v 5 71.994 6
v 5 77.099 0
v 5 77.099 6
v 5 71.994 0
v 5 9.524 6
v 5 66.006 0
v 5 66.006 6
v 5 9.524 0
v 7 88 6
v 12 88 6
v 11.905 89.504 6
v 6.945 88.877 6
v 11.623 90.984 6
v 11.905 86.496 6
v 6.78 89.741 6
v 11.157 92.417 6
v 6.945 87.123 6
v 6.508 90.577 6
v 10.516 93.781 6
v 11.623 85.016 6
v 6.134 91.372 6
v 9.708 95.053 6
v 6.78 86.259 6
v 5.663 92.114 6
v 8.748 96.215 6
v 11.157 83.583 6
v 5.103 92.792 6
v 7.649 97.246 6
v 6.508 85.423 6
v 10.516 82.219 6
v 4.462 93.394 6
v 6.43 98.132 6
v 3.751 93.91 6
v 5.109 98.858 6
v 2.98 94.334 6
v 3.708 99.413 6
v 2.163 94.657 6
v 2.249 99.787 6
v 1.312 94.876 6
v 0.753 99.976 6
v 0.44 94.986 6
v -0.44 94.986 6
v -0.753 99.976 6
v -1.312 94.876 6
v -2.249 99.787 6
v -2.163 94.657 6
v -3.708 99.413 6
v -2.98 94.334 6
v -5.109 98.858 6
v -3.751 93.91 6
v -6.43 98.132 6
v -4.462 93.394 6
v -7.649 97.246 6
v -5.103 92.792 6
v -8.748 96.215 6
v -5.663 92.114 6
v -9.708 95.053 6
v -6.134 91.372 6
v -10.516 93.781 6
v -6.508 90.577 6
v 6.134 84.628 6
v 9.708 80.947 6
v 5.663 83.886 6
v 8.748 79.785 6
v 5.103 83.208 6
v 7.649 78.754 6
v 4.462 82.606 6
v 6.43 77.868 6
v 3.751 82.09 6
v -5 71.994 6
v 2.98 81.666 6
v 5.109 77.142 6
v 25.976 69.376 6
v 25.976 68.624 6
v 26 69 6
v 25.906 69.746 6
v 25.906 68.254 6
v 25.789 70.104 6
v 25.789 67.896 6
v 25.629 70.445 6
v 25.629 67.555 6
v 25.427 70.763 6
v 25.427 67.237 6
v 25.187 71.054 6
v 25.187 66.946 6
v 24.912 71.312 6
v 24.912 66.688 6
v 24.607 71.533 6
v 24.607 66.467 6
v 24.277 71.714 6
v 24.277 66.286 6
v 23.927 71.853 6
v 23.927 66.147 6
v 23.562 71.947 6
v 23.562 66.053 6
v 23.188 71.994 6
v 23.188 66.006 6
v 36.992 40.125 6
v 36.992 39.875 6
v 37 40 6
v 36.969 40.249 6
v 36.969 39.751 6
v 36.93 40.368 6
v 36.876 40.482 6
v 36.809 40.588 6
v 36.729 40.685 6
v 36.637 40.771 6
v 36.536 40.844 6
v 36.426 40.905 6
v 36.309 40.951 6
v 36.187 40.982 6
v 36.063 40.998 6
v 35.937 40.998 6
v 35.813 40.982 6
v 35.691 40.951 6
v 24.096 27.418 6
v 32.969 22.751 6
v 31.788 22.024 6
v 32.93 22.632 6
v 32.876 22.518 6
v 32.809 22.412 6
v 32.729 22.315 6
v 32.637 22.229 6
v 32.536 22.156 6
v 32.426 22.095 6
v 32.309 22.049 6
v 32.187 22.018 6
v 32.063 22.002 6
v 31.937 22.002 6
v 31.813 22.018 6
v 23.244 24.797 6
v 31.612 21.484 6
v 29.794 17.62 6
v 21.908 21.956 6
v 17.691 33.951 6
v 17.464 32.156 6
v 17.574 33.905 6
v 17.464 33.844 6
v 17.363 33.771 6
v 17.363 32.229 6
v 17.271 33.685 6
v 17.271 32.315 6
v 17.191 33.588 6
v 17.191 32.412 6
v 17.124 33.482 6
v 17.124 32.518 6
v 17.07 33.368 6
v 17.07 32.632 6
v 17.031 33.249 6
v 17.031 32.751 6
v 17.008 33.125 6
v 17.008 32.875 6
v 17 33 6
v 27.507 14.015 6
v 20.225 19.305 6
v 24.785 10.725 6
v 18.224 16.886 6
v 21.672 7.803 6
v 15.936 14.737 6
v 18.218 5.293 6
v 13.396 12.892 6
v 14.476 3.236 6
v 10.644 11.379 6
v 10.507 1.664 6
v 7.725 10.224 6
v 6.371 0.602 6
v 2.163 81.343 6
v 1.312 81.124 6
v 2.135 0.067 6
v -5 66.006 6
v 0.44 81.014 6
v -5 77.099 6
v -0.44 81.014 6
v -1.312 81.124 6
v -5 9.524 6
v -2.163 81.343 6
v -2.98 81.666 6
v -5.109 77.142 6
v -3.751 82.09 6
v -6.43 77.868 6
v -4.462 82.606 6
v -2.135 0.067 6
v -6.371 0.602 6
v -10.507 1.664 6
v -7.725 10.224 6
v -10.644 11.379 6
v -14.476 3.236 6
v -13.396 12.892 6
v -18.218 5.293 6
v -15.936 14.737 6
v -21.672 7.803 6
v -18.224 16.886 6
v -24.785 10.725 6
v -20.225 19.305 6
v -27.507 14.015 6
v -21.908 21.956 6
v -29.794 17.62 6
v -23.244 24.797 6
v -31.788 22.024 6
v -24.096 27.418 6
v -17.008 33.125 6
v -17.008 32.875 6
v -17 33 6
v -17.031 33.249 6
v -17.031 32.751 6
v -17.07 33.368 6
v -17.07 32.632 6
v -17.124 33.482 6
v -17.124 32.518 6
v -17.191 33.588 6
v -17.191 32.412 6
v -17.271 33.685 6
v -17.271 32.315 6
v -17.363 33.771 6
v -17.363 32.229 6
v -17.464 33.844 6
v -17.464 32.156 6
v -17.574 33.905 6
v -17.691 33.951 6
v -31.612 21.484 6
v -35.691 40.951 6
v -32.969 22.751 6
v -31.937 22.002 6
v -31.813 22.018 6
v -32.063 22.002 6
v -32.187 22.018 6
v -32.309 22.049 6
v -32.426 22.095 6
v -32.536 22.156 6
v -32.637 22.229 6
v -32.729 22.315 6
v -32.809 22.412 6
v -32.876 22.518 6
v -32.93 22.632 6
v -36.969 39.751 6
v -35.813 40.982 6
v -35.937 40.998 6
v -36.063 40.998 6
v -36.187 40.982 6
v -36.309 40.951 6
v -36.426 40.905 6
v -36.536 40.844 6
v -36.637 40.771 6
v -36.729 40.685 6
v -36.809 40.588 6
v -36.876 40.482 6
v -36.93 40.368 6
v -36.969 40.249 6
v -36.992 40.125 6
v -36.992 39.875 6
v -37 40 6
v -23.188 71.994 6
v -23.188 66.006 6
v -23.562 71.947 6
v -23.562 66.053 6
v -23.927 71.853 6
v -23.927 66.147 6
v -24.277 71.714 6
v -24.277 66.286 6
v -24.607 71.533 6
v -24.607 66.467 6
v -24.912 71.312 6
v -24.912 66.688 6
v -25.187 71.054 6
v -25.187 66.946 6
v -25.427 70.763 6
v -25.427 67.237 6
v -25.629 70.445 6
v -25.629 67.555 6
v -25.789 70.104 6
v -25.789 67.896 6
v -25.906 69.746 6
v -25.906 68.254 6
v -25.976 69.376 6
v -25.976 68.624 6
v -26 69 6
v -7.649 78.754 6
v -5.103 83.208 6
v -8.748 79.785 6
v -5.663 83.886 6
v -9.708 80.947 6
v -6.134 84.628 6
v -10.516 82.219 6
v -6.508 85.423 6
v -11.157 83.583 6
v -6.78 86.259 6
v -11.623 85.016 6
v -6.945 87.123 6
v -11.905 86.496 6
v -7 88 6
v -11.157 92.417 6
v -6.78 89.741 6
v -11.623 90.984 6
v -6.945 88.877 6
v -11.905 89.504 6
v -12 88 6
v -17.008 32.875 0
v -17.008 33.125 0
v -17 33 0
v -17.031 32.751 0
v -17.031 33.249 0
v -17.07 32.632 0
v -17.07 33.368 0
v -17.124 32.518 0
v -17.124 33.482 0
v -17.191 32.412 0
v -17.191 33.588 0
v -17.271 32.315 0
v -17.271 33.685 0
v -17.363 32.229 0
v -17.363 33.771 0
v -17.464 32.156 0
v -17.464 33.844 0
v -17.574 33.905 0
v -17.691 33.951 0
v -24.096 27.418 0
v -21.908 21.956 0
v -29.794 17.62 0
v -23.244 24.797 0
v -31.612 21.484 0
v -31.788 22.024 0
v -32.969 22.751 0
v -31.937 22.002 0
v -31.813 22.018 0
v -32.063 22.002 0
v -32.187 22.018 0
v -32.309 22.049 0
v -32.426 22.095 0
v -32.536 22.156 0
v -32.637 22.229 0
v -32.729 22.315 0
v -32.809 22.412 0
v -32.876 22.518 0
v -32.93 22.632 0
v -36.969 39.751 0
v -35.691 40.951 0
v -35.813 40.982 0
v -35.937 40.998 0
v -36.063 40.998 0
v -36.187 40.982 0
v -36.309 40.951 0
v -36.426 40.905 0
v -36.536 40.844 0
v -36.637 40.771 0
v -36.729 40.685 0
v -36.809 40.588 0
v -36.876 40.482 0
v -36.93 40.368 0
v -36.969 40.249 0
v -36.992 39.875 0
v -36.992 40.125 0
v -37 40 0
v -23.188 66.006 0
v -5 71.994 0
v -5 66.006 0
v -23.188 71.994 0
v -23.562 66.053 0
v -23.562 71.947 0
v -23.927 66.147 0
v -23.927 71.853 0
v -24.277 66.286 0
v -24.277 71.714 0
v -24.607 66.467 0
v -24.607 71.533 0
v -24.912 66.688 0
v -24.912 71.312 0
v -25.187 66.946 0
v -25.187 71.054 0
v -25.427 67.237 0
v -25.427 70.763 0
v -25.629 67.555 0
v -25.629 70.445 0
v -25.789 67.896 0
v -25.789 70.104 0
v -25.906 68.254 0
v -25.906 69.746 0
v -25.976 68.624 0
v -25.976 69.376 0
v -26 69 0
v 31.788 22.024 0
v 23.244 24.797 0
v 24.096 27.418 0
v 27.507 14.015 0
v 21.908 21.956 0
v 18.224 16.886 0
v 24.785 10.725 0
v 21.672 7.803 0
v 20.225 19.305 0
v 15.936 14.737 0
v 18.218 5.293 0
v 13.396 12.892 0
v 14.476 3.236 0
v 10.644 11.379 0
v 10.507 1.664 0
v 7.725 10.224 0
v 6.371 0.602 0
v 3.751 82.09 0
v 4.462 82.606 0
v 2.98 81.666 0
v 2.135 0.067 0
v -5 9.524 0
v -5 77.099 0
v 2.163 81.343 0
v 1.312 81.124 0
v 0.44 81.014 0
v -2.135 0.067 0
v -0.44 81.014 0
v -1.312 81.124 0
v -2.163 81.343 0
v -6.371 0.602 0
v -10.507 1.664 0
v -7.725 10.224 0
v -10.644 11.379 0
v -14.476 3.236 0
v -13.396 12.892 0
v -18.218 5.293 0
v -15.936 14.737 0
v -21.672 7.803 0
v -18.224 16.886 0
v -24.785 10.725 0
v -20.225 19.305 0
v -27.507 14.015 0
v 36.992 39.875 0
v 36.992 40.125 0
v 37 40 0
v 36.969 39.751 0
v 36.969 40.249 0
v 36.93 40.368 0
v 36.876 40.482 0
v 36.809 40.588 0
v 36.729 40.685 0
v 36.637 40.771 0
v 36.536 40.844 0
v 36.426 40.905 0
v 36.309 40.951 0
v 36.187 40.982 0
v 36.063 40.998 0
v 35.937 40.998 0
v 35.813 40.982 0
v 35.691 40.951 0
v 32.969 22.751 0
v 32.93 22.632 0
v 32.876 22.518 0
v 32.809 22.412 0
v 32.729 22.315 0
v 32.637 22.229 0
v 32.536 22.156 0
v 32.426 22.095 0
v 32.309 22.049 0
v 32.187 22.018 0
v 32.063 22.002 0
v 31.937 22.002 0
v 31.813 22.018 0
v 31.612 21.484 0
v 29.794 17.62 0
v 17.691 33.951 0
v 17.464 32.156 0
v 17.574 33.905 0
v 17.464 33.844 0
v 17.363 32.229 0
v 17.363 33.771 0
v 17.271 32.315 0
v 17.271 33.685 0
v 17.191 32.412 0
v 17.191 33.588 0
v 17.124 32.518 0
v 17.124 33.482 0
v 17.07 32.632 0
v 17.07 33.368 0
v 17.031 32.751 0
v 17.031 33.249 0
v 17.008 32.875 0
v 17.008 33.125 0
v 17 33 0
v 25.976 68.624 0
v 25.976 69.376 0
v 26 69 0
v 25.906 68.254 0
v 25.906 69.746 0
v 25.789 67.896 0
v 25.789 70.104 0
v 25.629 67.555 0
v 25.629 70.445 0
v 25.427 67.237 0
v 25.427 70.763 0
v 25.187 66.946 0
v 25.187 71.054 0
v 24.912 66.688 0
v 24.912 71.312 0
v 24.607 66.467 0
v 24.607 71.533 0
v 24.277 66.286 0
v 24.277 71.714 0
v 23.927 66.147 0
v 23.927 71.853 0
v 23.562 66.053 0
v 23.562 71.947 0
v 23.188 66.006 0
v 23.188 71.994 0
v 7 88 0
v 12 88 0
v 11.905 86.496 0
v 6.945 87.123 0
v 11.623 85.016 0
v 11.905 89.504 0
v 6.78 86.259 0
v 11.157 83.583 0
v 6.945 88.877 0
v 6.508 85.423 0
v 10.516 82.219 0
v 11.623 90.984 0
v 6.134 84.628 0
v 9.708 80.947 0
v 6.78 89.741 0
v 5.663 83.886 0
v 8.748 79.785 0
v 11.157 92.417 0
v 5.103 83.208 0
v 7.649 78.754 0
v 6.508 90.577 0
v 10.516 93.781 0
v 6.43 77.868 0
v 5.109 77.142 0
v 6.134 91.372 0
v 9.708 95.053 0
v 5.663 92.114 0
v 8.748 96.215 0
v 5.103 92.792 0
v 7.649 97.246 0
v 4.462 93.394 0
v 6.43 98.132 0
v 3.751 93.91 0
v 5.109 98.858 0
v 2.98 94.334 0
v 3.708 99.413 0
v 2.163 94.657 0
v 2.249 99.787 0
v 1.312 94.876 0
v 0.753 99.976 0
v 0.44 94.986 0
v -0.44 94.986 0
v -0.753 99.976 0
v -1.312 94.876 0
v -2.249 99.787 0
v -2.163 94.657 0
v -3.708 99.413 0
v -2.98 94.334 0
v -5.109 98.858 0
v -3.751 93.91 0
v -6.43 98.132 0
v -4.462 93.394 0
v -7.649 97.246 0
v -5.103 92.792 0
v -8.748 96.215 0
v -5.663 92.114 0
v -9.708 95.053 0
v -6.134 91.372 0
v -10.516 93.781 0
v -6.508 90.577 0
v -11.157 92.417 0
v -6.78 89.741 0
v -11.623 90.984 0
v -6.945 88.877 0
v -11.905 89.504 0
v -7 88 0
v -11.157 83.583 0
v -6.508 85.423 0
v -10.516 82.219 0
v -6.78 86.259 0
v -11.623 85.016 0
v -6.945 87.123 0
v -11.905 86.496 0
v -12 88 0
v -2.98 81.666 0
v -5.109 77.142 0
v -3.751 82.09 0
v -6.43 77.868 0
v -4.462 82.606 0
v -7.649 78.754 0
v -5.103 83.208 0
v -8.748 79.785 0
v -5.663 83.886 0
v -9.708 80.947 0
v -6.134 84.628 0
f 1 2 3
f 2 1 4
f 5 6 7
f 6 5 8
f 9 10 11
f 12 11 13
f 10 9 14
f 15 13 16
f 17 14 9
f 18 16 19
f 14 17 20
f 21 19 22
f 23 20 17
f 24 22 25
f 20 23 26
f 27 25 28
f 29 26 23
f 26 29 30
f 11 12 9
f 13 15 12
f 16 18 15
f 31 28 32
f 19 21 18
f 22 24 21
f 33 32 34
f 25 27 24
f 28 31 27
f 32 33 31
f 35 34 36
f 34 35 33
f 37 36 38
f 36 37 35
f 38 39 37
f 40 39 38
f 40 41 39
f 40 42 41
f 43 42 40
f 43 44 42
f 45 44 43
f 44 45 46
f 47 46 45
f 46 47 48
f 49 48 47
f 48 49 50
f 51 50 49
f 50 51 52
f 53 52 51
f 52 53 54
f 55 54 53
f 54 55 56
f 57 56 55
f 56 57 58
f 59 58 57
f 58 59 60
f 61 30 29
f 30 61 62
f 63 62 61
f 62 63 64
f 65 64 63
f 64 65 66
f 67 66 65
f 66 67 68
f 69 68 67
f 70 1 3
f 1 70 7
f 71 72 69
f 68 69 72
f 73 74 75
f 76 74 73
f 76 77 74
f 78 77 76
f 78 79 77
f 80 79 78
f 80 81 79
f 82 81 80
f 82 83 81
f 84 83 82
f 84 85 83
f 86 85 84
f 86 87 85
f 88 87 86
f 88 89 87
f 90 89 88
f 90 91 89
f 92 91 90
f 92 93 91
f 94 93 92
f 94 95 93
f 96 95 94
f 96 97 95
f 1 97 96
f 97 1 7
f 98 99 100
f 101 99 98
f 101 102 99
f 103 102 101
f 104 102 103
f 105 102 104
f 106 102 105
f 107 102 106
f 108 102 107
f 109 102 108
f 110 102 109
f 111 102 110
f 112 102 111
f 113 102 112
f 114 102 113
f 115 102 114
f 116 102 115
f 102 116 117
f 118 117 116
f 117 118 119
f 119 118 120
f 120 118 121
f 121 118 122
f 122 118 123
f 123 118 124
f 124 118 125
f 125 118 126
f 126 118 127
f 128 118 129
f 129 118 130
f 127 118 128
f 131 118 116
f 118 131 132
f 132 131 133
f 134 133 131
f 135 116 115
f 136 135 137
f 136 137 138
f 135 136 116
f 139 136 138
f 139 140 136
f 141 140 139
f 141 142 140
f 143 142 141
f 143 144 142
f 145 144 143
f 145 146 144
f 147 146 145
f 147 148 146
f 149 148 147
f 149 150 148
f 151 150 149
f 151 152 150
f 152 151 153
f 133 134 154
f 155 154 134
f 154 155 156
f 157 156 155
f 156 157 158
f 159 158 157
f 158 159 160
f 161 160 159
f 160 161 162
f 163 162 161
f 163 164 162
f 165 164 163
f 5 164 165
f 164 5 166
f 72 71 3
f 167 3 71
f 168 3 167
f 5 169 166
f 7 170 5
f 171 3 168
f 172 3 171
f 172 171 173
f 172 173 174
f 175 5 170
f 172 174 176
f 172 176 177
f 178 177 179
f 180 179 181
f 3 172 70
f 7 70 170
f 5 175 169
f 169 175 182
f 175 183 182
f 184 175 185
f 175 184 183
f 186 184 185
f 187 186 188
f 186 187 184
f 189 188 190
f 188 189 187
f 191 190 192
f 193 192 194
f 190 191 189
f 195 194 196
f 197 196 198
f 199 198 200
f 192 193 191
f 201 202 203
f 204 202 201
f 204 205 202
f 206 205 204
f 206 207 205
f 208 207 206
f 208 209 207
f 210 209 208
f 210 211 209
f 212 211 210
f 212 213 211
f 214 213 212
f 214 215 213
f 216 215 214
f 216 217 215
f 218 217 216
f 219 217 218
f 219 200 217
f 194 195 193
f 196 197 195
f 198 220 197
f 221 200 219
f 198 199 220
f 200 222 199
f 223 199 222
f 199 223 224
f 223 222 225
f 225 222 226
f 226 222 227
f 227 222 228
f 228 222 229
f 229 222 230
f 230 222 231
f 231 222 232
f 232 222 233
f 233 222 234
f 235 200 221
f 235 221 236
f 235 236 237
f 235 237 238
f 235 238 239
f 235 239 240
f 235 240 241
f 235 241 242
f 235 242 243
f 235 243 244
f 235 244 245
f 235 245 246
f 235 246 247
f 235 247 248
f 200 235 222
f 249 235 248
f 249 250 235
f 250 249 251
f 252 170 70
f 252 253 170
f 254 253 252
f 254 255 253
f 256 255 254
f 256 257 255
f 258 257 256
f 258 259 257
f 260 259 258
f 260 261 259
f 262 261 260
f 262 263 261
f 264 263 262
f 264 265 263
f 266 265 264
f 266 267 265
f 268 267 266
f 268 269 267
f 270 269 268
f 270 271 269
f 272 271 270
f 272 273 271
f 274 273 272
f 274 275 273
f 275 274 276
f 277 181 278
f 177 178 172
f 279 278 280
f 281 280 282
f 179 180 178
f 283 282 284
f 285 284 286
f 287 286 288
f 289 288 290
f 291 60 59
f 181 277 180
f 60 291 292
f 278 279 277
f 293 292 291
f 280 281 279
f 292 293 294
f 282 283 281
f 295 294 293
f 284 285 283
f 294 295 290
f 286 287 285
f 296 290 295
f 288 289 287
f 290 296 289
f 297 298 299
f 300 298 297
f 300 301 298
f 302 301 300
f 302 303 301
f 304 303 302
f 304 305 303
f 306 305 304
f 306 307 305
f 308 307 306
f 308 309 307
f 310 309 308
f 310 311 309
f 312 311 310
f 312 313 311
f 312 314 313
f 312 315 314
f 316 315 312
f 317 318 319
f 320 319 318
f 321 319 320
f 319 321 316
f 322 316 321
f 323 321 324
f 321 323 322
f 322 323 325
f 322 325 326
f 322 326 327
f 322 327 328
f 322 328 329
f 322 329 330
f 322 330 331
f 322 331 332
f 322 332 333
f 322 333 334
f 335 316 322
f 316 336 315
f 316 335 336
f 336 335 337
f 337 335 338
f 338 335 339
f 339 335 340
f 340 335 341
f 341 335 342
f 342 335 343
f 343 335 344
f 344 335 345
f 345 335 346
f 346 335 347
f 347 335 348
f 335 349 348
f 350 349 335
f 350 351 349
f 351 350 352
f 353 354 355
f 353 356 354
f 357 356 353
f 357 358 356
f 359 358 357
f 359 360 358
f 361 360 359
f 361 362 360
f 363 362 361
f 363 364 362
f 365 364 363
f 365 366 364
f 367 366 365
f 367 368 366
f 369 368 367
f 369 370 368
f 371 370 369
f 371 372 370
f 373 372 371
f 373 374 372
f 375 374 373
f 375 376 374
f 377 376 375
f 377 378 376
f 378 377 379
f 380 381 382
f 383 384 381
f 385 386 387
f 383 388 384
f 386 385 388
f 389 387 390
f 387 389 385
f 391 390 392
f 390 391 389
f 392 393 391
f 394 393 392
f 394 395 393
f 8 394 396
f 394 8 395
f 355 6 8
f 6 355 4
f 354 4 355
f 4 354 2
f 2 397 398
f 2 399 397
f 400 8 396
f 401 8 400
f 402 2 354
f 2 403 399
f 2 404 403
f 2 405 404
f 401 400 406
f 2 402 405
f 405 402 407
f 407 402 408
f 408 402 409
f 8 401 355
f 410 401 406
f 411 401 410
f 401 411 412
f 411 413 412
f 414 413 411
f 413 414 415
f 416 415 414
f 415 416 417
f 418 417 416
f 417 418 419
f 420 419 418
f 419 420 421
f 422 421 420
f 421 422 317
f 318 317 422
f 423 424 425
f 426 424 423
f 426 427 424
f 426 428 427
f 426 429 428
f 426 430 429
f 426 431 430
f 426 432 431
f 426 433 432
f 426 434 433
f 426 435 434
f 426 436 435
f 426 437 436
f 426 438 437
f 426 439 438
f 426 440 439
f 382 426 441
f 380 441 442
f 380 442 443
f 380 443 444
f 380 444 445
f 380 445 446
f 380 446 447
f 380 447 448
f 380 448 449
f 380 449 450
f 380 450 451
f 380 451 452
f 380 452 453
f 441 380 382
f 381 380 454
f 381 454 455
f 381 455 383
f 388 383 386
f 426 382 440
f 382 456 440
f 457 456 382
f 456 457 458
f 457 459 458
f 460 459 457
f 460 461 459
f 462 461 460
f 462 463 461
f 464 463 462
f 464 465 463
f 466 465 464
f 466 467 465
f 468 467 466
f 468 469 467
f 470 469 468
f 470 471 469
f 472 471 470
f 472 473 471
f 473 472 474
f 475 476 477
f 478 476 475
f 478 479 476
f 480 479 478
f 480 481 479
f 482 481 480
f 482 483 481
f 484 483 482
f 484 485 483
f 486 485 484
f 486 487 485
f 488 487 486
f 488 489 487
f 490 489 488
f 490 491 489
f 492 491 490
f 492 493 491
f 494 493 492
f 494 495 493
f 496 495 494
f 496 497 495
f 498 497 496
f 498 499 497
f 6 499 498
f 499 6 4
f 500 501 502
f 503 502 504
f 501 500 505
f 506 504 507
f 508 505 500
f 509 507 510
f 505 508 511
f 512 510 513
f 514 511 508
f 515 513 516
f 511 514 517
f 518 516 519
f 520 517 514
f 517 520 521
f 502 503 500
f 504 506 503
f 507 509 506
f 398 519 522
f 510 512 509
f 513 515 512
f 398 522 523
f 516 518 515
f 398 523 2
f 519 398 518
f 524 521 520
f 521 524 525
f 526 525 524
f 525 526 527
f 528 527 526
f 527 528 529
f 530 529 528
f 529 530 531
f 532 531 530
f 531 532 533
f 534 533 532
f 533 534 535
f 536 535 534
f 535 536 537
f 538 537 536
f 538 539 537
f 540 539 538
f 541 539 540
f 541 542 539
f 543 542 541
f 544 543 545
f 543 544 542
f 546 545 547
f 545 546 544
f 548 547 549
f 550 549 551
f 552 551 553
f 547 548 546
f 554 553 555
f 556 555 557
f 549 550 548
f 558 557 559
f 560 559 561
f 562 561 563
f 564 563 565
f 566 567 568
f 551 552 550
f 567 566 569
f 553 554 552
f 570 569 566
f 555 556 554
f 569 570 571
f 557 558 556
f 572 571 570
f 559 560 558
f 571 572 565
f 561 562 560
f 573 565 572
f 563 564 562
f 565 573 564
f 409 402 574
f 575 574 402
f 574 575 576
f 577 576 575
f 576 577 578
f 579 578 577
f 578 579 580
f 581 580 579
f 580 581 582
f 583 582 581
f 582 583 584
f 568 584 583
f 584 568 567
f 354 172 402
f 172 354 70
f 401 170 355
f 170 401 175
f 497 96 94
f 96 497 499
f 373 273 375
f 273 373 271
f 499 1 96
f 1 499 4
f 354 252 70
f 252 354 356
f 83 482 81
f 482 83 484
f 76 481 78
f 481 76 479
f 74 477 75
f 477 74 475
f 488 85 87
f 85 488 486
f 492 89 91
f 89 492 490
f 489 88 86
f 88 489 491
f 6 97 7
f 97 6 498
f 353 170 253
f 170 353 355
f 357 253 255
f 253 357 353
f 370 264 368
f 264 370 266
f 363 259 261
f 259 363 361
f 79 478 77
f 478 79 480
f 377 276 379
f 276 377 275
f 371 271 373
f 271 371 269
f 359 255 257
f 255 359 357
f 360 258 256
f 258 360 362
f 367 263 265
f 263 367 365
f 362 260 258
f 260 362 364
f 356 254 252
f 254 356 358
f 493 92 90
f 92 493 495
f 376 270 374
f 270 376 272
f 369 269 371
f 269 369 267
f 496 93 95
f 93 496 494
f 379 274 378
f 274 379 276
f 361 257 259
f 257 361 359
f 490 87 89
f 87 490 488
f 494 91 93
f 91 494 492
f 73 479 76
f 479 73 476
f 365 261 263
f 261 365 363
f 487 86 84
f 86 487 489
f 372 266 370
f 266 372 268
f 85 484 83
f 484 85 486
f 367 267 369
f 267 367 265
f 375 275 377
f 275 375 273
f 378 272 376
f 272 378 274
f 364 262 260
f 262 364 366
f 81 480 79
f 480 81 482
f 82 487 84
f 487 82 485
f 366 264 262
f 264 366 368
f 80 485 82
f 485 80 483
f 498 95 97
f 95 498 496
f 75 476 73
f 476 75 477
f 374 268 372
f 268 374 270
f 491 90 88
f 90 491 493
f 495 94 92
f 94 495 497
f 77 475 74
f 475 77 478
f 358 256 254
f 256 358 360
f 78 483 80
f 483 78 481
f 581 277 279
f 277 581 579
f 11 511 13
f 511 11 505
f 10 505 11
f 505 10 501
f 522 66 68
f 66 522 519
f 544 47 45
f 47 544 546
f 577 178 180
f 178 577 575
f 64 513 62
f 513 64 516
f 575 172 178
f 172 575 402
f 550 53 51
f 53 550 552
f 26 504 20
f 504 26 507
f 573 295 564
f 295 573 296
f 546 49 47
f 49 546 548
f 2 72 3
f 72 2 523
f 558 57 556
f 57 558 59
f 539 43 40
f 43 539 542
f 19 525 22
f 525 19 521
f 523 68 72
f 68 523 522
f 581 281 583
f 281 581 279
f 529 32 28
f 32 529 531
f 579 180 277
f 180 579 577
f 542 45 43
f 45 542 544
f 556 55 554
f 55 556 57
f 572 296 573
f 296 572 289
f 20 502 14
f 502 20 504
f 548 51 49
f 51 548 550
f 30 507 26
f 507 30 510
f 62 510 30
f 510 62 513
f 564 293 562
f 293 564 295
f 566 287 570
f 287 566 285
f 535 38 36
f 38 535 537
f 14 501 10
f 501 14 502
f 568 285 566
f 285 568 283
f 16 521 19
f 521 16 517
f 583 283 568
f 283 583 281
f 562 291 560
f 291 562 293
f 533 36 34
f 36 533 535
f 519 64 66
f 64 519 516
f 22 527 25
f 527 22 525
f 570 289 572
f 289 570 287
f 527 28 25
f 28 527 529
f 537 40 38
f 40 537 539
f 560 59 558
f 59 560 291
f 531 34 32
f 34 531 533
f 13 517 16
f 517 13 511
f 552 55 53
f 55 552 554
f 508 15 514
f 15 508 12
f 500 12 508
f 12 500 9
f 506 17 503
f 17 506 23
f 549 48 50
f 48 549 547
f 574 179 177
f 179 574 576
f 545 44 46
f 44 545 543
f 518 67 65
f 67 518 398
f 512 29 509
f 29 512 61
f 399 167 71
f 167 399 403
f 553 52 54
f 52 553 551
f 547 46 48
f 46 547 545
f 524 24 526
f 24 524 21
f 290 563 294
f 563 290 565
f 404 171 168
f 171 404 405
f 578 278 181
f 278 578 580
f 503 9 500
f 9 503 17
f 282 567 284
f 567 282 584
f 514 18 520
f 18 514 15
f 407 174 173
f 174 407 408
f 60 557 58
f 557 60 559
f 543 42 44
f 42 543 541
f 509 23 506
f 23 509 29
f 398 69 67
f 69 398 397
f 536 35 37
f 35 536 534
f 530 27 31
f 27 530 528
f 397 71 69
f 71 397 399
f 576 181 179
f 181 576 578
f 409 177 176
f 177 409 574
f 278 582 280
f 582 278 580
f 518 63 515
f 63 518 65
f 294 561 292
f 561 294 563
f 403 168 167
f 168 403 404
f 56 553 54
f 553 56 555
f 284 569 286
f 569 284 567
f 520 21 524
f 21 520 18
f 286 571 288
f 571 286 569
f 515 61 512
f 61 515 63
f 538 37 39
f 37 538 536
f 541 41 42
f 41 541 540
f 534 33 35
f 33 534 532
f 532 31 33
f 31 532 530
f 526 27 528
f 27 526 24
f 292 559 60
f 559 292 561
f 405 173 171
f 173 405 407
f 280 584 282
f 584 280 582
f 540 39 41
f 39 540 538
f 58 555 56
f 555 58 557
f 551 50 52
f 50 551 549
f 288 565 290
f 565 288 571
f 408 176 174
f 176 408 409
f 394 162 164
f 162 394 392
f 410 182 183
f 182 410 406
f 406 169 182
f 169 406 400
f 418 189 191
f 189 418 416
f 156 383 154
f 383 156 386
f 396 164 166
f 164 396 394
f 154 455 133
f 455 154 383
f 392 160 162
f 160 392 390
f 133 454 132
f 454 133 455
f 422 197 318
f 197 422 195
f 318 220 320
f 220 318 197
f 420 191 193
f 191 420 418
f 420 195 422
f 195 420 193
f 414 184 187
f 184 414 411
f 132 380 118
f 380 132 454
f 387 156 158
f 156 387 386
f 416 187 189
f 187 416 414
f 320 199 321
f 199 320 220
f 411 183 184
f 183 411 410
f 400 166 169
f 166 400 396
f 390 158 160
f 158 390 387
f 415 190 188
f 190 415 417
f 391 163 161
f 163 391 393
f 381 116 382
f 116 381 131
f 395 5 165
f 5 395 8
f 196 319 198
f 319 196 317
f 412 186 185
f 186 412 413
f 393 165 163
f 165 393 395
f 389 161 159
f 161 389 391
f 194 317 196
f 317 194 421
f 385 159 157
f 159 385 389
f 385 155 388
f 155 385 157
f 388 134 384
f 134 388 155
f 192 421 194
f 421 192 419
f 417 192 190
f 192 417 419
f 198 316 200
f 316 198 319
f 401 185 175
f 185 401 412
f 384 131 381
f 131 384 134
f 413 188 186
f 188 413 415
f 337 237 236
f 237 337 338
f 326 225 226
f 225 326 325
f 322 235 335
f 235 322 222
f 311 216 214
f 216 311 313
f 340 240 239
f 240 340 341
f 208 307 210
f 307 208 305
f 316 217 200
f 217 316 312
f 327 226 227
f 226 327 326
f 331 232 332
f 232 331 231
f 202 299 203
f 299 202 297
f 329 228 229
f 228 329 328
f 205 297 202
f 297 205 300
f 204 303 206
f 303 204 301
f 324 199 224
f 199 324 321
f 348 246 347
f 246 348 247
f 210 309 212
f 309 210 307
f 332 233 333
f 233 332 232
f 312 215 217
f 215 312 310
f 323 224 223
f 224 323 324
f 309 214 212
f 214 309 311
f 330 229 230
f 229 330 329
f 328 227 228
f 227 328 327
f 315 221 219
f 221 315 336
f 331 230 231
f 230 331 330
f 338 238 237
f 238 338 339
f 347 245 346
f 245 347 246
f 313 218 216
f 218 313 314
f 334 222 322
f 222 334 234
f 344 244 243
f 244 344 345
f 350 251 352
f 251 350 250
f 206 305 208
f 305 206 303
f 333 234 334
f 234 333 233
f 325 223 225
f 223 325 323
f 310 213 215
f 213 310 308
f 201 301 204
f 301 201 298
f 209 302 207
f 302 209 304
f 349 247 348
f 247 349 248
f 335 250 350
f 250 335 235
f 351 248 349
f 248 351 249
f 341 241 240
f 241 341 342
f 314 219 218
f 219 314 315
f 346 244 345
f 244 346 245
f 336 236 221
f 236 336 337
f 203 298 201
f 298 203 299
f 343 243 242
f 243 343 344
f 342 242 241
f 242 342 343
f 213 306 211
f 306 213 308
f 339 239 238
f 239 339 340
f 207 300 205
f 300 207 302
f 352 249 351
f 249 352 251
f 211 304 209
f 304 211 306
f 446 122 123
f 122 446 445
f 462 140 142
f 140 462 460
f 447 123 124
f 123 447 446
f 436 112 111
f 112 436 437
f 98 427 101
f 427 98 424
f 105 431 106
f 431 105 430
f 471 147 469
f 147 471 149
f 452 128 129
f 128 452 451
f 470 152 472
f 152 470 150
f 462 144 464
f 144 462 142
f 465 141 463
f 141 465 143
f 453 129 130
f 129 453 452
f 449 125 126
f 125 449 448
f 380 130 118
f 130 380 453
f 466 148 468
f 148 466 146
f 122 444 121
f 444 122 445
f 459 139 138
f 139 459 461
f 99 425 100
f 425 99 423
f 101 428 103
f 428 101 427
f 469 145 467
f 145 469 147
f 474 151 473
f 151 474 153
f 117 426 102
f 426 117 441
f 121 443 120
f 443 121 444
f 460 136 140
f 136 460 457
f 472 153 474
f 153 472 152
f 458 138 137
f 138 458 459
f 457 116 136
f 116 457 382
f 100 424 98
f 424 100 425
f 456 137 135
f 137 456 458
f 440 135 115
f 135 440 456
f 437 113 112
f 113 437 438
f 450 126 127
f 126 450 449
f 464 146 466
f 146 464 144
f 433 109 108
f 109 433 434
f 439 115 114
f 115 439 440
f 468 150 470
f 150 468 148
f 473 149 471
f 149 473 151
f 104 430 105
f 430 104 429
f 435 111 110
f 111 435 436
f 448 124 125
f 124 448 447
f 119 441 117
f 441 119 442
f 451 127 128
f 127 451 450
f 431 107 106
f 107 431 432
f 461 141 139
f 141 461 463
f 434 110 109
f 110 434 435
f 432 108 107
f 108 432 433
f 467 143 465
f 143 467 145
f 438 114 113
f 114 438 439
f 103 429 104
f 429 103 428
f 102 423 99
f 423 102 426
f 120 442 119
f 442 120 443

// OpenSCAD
union() {
  union() {
    union() {
      union() {
        union() {
          translate([-5, 0, 0]) {
            translate([0, 4, 0]) {
              cube([10, 76, 6]);
            }
          }
          hull() {
            translate([-23, 0, 0]) {
              translate([0, 69, 0]) {
                cylinder(h = 6, r = 3);
              }
            }
            translate([23, 0, 0]) {
              translate([0, 69, 0]) {
                cylinder(h = 6, r = 3);
              }
            }
          }
        }
        difference() {
          translate([0, 88, 0]) {
            cylinder(h = 6, r = 12);
          }
          translate([0, 88, 0]) {
            translate([0, 0, -1]) {
              cylinder(h = 8, r = 7);
            }
          }
        }
      }
      difference() {
        difference() {
          translate([0, 34, 0]) {
            cylinder(h = 6, r = 34);
          }
          translate([0, 34, 0]) {
            translate([0, 0, -1]) {
              cylinder(h = 8, r = 25);
            }
          }
        }
        translate([-40, 0, 0]) {
          translate([0, 34, 0]) {
            translate([0, 0, -1]) {
              cube([80, 80, 8]);
            }
          }
        }
      }
    }
    hull() {
      hull() {
        translate([-36, 0, 0]) {
          translate([0, 40, 0]) {
            cylinder(h = 6, r = 1);
          }
        }
        translate([-18, 0, 0]) {
          translate([0, 33, 0]) {
            cylinder(h = 6, r = 1);
          }
        }
      }
      translate([-32, 0, 0]) {
        translate([0, 23, 0]) {
          cylinder(h = 6, r = 1);
        }
      }
    }
  }
  mirror([1, 0, 0]) {
    hull() {
      hull() {
        translate([-36, 0, 0]) {
          translate([0, 40, 0]) {
            cylinder(h = 6, r = 1);
          }
        }
        translate([-18, 0, 0]) {
          translate([0, 33, 0]) {
            cylinder(h = 6, r = 1);
          }
        }
      }
      translate([-32, 0, 0]) {
        translate([0, 23, 0]) {
          cylinder(h = 6, r = 1);
        }
      }
    }
  }
}
$fn = 50;
